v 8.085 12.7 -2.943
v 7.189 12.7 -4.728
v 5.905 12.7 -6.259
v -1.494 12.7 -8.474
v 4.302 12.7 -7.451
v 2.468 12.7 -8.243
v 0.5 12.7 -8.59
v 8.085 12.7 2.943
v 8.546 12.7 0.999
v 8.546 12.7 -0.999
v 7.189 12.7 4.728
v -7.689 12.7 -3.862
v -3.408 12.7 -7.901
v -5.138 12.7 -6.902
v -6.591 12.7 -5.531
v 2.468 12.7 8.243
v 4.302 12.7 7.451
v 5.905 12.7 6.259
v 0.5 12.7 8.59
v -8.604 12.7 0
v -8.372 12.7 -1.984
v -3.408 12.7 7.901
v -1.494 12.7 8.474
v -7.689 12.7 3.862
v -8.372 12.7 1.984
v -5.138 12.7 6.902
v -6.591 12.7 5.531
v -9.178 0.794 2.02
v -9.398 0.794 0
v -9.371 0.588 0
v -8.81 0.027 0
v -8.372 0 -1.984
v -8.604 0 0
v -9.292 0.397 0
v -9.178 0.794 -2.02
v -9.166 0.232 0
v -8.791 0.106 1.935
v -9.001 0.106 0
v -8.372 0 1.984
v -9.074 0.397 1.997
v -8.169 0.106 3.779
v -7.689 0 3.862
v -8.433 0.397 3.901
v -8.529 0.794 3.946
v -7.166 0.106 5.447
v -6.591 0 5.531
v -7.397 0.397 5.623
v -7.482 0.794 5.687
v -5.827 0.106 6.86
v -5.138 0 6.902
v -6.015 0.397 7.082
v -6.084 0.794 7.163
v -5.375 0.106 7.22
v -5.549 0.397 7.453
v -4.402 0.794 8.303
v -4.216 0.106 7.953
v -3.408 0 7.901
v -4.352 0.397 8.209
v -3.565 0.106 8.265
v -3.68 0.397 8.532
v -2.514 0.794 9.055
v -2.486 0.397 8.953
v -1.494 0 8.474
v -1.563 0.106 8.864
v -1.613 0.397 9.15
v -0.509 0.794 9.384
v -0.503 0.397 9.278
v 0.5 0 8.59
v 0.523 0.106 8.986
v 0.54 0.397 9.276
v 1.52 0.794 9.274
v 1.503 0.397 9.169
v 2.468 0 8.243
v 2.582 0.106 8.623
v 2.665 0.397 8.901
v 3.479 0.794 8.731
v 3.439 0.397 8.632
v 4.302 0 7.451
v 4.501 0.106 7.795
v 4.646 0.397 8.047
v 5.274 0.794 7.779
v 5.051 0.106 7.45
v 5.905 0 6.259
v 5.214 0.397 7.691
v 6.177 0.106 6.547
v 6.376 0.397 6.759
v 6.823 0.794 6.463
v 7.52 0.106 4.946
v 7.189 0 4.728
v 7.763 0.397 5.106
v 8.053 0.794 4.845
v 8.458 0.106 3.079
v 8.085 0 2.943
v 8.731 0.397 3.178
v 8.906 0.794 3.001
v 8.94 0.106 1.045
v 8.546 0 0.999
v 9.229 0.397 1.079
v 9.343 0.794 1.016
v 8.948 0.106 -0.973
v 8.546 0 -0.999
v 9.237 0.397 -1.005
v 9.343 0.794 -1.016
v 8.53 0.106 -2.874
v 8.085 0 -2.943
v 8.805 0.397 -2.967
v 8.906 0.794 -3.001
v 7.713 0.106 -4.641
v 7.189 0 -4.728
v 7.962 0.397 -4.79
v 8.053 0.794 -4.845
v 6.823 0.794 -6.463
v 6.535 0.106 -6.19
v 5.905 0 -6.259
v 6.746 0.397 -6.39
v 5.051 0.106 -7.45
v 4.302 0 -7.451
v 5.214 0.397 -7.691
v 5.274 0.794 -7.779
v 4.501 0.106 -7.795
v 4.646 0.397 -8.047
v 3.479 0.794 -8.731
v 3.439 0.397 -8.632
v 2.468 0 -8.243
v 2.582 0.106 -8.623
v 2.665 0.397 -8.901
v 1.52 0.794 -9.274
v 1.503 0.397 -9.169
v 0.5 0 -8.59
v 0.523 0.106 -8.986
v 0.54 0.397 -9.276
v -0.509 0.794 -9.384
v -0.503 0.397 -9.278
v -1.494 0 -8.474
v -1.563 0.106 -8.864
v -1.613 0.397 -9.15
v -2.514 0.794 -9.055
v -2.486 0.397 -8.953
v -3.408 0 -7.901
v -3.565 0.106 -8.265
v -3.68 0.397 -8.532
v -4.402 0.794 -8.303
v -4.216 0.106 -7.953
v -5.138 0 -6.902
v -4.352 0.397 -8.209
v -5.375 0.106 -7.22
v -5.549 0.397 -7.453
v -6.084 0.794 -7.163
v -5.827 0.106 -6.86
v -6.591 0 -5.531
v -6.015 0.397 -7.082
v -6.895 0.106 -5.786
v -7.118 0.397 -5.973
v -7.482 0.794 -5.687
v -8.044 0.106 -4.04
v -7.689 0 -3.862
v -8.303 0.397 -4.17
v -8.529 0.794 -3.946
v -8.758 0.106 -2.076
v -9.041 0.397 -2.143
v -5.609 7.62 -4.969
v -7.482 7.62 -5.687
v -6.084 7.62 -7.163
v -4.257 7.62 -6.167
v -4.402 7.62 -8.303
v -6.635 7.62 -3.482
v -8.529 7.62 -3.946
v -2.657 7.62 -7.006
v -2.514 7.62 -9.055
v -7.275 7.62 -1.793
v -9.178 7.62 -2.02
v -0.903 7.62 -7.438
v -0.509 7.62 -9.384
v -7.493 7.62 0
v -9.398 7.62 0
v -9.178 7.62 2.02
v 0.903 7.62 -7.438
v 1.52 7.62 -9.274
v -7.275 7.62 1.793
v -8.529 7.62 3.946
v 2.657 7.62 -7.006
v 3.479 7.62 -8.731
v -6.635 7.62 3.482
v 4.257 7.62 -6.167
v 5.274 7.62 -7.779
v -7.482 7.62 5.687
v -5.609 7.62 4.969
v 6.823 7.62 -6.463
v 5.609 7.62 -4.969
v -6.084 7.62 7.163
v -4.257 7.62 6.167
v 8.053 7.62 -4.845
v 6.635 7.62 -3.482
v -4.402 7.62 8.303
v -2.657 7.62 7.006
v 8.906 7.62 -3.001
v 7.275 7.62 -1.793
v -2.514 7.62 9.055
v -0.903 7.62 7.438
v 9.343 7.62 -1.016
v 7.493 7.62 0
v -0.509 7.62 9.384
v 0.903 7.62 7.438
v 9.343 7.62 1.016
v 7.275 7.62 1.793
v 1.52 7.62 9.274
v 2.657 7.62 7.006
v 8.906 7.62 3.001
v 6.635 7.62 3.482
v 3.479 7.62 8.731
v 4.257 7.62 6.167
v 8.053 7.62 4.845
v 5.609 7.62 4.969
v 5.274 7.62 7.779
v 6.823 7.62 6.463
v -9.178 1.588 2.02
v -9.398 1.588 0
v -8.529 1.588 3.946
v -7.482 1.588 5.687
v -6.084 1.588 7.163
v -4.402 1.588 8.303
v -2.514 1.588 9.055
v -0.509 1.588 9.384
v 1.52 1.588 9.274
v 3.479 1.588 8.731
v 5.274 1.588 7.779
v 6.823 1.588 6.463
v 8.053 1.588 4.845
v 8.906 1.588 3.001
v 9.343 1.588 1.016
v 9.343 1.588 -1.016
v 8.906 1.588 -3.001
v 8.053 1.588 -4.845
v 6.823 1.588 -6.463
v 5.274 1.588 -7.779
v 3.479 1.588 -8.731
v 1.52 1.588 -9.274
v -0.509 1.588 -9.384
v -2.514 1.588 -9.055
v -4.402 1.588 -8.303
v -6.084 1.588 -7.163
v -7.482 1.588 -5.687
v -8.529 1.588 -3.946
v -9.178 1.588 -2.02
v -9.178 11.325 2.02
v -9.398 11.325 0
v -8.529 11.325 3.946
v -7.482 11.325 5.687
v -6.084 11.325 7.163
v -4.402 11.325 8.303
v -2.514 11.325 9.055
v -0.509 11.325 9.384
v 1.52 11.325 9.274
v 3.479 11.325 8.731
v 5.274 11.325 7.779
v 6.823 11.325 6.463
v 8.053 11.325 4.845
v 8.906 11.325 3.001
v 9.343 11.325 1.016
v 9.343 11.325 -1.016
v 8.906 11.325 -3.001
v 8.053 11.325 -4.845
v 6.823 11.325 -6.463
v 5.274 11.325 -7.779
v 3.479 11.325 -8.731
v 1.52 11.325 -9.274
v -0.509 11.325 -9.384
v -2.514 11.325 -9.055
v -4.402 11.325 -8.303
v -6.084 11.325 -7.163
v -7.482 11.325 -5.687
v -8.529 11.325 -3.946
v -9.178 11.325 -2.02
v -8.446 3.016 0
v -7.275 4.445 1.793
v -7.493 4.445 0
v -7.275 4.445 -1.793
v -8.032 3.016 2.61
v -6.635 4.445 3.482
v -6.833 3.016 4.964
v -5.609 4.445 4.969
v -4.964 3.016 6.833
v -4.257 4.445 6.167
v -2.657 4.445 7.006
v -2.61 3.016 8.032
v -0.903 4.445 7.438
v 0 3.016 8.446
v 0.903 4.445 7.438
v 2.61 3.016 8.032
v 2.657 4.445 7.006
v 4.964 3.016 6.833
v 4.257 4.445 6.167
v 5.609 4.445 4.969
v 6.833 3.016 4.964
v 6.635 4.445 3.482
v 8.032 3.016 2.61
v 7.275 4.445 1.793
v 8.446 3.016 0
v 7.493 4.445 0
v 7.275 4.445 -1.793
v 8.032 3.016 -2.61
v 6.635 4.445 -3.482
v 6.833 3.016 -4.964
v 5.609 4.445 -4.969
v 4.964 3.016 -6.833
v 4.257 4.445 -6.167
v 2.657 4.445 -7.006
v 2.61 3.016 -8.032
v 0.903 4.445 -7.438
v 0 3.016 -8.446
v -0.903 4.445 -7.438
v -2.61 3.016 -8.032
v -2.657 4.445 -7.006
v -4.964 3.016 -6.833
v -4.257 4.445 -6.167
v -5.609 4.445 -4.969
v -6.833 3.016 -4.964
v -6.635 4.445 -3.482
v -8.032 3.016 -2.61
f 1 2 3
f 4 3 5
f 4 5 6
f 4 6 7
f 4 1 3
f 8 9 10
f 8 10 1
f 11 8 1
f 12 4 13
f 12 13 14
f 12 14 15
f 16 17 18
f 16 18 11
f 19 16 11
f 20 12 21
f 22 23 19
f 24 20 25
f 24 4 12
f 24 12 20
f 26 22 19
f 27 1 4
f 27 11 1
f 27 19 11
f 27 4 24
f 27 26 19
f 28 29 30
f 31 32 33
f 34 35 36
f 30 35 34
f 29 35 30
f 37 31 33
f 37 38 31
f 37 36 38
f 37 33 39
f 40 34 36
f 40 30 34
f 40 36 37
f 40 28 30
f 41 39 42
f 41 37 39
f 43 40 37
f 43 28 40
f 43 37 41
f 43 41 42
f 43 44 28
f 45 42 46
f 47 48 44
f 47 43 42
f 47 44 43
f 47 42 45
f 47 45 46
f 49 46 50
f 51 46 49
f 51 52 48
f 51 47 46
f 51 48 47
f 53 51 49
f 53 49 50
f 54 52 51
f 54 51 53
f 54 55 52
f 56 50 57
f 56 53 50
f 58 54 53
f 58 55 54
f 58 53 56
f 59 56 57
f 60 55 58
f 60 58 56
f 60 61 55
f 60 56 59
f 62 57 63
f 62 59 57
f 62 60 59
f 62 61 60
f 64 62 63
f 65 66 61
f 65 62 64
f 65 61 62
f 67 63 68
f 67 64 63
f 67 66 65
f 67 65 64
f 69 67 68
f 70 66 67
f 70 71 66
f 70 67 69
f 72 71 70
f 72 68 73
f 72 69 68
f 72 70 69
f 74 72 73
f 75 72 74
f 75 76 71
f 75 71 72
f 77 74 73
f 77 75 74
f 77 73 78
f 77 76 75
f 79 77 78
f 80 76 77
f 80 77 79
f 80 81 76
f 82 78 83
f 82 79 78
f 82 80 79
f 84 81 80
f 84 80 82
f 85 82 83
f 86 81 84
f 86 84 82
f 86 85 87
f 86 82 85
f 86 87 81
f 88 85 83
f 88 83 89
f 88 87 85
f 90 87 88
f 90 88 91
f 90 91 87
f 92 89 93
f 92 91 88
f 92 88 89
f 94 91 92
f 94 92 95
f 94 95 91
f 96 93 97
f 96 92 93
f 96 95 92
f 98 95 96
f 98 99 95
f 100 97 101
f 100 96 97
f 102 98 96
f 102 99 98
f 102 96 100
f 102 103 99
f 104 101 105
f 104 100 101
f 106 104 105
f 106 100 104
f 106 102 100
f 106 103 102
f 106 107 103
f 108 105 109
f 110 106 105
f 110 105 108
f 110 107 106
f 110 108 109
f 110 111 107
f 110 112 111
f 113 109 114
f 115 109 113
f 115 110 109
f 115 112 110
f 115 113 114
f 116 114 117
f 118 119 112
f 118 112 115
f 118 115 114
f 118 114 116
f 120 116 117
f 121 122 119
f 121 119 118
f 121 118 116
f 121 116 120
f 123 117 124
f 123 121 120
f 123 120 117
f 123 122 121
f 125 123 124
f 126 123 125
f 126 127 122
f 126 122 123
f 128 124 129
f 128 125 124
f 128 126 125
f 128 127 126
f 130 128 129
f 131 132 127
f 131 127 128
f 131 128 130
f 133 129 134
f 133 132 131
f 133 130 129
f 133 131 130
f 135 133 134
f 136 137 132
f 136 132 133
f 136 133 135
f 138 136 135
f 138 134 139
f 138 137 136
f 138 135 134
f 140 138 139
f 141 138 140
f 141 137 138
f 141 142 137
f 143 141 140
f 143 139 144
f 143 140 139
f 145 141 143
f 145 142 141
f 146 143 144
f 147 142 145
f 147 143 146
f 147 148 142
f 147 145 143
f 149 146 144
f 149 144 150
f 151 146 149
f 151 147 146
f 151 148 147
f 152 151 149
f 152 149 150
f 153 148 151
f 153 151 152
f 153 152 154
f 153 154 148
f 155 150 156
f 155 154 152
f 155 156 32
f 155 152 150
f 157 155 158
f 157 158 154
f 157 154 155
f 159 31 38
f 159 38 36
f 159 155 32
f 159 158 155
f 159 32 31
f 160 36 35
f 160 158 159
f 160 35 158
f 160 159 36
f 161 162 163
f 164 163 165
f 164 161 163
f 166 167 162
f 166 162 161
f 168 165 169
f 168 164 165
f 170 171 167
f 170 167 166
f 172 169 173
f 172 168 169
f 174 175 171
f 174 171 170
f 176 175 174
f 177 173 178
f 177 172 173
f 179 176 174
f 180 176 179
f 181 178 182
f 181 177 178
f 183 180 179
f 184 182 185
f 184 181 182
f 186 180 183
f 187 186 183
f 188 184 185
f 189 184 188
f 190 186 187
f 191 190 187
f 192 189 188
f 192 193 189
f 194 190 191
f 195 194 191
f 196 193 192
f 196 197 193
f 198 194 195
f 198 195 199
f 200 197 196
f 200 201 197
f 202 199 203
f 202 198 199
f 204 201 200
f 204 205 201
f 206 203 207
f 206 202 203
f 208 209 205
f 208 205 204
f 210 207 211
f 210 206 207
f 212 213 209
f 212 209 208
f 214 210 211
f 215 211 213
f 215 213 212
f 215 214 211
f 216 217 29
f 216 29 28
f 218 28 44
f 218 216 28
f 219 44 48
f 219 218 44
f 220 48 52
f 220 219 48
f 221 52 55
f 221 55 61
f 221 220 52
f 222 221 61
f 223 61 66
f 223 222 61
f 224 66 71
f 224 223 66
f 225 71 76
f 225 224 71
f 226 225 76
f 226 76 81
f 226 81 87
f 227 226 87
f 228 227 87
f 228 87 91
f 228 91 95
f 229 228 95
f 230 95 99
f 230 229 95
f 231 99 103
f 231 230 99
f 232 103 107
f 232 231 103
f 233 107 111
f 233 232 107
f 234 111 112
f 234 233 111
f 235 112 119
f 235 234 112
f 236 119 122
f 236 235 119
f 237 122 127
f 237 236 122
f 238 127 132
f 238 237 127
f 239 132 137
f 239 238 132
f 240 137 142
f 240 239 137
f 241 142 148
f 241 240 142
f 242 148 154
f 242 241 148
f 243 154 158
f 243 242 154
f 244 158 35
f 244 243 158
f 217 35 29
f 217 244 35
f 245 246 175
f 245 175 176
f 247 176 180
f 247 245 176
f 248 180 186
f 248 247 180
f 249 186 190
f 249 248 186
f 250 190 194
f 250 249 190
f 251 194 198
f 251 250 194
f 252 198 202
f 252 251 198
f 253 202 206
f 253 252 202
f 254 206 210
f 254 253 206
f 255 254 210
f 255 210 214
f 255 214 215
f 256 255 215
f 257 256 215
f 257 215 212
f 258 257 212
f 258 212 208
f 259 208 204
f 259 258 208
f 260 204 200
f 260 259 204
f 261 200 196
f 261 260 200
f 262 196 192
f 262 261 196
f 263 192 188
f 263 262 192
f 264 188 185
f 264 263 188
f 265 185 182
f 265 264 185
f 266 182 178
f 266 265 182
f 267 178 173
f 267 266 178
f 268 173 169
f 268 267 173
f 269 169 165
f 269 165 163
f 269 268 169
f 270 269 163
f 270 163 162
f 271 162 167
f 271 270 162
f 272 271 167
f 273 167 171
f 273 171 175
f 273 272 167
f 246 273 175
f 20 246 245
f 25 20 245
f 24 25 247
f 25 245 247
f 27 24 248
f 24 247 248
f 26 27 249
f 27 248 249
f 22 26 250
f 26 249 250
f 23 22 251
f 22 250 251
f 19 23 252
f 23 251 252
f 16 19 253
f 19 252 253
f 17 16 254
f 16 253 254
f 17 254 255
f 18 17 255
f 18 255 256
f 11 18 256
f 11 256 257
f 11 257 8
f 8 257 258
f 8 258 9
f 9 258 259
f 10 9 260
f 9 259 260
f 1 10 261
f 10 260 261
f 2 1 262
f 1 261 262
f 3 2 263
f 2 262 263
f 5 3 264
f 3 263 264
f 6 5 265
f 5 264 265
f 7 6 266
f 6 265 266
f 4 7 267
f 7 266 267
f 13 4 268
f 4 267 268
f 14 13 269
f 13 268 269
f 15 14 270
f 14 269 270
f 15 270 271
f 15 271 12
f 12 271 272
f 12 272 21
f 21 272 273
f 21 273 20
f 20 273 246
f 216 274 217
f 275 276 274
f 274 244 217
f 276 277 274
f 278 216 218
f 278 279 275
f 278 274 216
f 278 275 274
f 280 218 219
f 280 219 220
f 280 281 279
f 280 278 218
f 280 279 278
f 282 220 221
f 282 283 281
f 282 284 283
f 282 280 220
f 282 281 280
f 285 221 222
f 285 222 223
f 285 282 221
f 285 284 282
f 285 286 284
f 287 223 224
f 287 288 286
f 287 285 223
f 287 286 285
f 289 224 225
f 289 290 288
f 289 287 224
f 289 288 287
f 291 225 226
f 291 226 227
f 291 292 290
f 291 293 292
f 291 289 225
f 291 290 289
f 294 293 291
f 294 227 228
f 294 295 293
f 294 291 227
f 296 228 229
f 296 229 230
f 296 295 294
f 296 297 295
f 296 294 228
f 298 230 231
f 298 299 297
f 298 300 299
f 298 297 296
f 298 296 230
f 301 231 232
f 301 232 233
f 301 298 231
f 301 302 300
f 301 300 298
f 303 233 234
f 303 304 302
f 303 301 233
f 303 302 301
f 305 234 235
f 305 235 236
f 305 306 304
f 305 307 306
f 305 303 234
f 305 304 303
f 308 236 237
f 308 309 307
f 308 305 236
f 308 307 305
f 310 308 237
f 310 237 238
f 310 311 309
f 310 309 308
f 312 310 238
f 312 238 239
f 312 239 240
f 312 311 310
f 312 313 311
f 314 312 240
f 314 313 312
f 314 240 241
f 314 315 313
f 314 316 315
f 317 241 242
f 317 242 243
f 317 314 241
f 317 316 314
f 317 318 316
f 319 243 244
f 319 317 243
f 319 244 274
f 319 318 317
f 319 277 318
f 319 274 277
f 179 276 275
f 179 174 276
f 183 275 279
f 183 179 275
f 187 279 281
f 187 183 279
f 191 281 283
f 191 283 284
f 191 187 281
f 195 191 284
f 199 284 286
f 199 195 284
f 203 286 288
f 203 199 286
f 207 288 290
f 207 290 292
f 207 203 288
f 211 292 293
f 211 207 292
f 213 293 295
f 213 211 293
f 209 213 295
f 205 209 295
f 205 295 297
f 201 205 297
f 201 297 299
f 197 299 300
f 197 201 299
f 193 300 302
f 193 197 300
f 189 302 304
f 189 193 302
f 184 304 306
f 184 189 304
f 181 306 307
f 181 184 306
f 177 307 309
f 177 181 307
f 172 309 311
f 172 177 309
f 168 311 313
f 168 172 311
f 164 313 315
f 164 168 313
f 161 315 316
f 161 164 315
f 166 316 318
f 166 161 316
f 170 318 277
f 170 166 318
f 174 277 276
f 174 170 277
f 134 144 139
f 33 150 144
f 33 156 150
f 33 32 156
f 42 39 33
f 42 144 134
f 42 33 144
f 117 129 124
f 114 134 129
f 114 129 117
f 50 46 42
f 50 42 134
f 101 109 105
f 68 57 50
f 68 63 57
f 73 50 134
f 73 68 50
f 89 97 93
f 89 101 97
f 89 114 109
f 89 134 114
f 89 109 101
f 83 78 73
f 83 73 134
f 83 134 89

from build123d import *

# Parameters (mm, degrees)
FILLET1_R      = 0.79375
CHAMFER1_SIZE  = 0.79375
CHAMFER1_SIZE2 = 1.374815329


with BuildPart() as part:
    # Sketch1 → Revolve1 (revolve)
    with BuildSketch(Plane.XY):
        Polygon((0, 0), (-9.398, 0), (-9.398, 1.5875), (-7.493, 4.445), (-7.493, 7.62), (-9.398, 7.62), (-9.398, 12.7), (0, 12.7), align=None)
    revolve(axis=Axis((0, 0, 0), (0, 1, 0)))

    # Fillet1
    fillet1_edges = [part.edges().sort_by_distance(p)[0] for p in [
        (9.398, 0, 0),
    ]]
    fillet(fillet1_edges, radius=FILLET1_R)

    # Chamfer1
    chamfer1_edges = [part.edges().sort_by_distance(p)[0] for p in [
        (9.398, 12.7, 0),
    ]]
    chamfer1_side = [part.faces().sort_by_distance(p)[0] for p in [
        (0, 12.7, 0),
    ]]
    chamfer(chamfer1_edges, length=CHAMFER1_SIZE, length2=CHAMFER1_SIZE2, reference=chamfer1_side[0])


solid = part.part
